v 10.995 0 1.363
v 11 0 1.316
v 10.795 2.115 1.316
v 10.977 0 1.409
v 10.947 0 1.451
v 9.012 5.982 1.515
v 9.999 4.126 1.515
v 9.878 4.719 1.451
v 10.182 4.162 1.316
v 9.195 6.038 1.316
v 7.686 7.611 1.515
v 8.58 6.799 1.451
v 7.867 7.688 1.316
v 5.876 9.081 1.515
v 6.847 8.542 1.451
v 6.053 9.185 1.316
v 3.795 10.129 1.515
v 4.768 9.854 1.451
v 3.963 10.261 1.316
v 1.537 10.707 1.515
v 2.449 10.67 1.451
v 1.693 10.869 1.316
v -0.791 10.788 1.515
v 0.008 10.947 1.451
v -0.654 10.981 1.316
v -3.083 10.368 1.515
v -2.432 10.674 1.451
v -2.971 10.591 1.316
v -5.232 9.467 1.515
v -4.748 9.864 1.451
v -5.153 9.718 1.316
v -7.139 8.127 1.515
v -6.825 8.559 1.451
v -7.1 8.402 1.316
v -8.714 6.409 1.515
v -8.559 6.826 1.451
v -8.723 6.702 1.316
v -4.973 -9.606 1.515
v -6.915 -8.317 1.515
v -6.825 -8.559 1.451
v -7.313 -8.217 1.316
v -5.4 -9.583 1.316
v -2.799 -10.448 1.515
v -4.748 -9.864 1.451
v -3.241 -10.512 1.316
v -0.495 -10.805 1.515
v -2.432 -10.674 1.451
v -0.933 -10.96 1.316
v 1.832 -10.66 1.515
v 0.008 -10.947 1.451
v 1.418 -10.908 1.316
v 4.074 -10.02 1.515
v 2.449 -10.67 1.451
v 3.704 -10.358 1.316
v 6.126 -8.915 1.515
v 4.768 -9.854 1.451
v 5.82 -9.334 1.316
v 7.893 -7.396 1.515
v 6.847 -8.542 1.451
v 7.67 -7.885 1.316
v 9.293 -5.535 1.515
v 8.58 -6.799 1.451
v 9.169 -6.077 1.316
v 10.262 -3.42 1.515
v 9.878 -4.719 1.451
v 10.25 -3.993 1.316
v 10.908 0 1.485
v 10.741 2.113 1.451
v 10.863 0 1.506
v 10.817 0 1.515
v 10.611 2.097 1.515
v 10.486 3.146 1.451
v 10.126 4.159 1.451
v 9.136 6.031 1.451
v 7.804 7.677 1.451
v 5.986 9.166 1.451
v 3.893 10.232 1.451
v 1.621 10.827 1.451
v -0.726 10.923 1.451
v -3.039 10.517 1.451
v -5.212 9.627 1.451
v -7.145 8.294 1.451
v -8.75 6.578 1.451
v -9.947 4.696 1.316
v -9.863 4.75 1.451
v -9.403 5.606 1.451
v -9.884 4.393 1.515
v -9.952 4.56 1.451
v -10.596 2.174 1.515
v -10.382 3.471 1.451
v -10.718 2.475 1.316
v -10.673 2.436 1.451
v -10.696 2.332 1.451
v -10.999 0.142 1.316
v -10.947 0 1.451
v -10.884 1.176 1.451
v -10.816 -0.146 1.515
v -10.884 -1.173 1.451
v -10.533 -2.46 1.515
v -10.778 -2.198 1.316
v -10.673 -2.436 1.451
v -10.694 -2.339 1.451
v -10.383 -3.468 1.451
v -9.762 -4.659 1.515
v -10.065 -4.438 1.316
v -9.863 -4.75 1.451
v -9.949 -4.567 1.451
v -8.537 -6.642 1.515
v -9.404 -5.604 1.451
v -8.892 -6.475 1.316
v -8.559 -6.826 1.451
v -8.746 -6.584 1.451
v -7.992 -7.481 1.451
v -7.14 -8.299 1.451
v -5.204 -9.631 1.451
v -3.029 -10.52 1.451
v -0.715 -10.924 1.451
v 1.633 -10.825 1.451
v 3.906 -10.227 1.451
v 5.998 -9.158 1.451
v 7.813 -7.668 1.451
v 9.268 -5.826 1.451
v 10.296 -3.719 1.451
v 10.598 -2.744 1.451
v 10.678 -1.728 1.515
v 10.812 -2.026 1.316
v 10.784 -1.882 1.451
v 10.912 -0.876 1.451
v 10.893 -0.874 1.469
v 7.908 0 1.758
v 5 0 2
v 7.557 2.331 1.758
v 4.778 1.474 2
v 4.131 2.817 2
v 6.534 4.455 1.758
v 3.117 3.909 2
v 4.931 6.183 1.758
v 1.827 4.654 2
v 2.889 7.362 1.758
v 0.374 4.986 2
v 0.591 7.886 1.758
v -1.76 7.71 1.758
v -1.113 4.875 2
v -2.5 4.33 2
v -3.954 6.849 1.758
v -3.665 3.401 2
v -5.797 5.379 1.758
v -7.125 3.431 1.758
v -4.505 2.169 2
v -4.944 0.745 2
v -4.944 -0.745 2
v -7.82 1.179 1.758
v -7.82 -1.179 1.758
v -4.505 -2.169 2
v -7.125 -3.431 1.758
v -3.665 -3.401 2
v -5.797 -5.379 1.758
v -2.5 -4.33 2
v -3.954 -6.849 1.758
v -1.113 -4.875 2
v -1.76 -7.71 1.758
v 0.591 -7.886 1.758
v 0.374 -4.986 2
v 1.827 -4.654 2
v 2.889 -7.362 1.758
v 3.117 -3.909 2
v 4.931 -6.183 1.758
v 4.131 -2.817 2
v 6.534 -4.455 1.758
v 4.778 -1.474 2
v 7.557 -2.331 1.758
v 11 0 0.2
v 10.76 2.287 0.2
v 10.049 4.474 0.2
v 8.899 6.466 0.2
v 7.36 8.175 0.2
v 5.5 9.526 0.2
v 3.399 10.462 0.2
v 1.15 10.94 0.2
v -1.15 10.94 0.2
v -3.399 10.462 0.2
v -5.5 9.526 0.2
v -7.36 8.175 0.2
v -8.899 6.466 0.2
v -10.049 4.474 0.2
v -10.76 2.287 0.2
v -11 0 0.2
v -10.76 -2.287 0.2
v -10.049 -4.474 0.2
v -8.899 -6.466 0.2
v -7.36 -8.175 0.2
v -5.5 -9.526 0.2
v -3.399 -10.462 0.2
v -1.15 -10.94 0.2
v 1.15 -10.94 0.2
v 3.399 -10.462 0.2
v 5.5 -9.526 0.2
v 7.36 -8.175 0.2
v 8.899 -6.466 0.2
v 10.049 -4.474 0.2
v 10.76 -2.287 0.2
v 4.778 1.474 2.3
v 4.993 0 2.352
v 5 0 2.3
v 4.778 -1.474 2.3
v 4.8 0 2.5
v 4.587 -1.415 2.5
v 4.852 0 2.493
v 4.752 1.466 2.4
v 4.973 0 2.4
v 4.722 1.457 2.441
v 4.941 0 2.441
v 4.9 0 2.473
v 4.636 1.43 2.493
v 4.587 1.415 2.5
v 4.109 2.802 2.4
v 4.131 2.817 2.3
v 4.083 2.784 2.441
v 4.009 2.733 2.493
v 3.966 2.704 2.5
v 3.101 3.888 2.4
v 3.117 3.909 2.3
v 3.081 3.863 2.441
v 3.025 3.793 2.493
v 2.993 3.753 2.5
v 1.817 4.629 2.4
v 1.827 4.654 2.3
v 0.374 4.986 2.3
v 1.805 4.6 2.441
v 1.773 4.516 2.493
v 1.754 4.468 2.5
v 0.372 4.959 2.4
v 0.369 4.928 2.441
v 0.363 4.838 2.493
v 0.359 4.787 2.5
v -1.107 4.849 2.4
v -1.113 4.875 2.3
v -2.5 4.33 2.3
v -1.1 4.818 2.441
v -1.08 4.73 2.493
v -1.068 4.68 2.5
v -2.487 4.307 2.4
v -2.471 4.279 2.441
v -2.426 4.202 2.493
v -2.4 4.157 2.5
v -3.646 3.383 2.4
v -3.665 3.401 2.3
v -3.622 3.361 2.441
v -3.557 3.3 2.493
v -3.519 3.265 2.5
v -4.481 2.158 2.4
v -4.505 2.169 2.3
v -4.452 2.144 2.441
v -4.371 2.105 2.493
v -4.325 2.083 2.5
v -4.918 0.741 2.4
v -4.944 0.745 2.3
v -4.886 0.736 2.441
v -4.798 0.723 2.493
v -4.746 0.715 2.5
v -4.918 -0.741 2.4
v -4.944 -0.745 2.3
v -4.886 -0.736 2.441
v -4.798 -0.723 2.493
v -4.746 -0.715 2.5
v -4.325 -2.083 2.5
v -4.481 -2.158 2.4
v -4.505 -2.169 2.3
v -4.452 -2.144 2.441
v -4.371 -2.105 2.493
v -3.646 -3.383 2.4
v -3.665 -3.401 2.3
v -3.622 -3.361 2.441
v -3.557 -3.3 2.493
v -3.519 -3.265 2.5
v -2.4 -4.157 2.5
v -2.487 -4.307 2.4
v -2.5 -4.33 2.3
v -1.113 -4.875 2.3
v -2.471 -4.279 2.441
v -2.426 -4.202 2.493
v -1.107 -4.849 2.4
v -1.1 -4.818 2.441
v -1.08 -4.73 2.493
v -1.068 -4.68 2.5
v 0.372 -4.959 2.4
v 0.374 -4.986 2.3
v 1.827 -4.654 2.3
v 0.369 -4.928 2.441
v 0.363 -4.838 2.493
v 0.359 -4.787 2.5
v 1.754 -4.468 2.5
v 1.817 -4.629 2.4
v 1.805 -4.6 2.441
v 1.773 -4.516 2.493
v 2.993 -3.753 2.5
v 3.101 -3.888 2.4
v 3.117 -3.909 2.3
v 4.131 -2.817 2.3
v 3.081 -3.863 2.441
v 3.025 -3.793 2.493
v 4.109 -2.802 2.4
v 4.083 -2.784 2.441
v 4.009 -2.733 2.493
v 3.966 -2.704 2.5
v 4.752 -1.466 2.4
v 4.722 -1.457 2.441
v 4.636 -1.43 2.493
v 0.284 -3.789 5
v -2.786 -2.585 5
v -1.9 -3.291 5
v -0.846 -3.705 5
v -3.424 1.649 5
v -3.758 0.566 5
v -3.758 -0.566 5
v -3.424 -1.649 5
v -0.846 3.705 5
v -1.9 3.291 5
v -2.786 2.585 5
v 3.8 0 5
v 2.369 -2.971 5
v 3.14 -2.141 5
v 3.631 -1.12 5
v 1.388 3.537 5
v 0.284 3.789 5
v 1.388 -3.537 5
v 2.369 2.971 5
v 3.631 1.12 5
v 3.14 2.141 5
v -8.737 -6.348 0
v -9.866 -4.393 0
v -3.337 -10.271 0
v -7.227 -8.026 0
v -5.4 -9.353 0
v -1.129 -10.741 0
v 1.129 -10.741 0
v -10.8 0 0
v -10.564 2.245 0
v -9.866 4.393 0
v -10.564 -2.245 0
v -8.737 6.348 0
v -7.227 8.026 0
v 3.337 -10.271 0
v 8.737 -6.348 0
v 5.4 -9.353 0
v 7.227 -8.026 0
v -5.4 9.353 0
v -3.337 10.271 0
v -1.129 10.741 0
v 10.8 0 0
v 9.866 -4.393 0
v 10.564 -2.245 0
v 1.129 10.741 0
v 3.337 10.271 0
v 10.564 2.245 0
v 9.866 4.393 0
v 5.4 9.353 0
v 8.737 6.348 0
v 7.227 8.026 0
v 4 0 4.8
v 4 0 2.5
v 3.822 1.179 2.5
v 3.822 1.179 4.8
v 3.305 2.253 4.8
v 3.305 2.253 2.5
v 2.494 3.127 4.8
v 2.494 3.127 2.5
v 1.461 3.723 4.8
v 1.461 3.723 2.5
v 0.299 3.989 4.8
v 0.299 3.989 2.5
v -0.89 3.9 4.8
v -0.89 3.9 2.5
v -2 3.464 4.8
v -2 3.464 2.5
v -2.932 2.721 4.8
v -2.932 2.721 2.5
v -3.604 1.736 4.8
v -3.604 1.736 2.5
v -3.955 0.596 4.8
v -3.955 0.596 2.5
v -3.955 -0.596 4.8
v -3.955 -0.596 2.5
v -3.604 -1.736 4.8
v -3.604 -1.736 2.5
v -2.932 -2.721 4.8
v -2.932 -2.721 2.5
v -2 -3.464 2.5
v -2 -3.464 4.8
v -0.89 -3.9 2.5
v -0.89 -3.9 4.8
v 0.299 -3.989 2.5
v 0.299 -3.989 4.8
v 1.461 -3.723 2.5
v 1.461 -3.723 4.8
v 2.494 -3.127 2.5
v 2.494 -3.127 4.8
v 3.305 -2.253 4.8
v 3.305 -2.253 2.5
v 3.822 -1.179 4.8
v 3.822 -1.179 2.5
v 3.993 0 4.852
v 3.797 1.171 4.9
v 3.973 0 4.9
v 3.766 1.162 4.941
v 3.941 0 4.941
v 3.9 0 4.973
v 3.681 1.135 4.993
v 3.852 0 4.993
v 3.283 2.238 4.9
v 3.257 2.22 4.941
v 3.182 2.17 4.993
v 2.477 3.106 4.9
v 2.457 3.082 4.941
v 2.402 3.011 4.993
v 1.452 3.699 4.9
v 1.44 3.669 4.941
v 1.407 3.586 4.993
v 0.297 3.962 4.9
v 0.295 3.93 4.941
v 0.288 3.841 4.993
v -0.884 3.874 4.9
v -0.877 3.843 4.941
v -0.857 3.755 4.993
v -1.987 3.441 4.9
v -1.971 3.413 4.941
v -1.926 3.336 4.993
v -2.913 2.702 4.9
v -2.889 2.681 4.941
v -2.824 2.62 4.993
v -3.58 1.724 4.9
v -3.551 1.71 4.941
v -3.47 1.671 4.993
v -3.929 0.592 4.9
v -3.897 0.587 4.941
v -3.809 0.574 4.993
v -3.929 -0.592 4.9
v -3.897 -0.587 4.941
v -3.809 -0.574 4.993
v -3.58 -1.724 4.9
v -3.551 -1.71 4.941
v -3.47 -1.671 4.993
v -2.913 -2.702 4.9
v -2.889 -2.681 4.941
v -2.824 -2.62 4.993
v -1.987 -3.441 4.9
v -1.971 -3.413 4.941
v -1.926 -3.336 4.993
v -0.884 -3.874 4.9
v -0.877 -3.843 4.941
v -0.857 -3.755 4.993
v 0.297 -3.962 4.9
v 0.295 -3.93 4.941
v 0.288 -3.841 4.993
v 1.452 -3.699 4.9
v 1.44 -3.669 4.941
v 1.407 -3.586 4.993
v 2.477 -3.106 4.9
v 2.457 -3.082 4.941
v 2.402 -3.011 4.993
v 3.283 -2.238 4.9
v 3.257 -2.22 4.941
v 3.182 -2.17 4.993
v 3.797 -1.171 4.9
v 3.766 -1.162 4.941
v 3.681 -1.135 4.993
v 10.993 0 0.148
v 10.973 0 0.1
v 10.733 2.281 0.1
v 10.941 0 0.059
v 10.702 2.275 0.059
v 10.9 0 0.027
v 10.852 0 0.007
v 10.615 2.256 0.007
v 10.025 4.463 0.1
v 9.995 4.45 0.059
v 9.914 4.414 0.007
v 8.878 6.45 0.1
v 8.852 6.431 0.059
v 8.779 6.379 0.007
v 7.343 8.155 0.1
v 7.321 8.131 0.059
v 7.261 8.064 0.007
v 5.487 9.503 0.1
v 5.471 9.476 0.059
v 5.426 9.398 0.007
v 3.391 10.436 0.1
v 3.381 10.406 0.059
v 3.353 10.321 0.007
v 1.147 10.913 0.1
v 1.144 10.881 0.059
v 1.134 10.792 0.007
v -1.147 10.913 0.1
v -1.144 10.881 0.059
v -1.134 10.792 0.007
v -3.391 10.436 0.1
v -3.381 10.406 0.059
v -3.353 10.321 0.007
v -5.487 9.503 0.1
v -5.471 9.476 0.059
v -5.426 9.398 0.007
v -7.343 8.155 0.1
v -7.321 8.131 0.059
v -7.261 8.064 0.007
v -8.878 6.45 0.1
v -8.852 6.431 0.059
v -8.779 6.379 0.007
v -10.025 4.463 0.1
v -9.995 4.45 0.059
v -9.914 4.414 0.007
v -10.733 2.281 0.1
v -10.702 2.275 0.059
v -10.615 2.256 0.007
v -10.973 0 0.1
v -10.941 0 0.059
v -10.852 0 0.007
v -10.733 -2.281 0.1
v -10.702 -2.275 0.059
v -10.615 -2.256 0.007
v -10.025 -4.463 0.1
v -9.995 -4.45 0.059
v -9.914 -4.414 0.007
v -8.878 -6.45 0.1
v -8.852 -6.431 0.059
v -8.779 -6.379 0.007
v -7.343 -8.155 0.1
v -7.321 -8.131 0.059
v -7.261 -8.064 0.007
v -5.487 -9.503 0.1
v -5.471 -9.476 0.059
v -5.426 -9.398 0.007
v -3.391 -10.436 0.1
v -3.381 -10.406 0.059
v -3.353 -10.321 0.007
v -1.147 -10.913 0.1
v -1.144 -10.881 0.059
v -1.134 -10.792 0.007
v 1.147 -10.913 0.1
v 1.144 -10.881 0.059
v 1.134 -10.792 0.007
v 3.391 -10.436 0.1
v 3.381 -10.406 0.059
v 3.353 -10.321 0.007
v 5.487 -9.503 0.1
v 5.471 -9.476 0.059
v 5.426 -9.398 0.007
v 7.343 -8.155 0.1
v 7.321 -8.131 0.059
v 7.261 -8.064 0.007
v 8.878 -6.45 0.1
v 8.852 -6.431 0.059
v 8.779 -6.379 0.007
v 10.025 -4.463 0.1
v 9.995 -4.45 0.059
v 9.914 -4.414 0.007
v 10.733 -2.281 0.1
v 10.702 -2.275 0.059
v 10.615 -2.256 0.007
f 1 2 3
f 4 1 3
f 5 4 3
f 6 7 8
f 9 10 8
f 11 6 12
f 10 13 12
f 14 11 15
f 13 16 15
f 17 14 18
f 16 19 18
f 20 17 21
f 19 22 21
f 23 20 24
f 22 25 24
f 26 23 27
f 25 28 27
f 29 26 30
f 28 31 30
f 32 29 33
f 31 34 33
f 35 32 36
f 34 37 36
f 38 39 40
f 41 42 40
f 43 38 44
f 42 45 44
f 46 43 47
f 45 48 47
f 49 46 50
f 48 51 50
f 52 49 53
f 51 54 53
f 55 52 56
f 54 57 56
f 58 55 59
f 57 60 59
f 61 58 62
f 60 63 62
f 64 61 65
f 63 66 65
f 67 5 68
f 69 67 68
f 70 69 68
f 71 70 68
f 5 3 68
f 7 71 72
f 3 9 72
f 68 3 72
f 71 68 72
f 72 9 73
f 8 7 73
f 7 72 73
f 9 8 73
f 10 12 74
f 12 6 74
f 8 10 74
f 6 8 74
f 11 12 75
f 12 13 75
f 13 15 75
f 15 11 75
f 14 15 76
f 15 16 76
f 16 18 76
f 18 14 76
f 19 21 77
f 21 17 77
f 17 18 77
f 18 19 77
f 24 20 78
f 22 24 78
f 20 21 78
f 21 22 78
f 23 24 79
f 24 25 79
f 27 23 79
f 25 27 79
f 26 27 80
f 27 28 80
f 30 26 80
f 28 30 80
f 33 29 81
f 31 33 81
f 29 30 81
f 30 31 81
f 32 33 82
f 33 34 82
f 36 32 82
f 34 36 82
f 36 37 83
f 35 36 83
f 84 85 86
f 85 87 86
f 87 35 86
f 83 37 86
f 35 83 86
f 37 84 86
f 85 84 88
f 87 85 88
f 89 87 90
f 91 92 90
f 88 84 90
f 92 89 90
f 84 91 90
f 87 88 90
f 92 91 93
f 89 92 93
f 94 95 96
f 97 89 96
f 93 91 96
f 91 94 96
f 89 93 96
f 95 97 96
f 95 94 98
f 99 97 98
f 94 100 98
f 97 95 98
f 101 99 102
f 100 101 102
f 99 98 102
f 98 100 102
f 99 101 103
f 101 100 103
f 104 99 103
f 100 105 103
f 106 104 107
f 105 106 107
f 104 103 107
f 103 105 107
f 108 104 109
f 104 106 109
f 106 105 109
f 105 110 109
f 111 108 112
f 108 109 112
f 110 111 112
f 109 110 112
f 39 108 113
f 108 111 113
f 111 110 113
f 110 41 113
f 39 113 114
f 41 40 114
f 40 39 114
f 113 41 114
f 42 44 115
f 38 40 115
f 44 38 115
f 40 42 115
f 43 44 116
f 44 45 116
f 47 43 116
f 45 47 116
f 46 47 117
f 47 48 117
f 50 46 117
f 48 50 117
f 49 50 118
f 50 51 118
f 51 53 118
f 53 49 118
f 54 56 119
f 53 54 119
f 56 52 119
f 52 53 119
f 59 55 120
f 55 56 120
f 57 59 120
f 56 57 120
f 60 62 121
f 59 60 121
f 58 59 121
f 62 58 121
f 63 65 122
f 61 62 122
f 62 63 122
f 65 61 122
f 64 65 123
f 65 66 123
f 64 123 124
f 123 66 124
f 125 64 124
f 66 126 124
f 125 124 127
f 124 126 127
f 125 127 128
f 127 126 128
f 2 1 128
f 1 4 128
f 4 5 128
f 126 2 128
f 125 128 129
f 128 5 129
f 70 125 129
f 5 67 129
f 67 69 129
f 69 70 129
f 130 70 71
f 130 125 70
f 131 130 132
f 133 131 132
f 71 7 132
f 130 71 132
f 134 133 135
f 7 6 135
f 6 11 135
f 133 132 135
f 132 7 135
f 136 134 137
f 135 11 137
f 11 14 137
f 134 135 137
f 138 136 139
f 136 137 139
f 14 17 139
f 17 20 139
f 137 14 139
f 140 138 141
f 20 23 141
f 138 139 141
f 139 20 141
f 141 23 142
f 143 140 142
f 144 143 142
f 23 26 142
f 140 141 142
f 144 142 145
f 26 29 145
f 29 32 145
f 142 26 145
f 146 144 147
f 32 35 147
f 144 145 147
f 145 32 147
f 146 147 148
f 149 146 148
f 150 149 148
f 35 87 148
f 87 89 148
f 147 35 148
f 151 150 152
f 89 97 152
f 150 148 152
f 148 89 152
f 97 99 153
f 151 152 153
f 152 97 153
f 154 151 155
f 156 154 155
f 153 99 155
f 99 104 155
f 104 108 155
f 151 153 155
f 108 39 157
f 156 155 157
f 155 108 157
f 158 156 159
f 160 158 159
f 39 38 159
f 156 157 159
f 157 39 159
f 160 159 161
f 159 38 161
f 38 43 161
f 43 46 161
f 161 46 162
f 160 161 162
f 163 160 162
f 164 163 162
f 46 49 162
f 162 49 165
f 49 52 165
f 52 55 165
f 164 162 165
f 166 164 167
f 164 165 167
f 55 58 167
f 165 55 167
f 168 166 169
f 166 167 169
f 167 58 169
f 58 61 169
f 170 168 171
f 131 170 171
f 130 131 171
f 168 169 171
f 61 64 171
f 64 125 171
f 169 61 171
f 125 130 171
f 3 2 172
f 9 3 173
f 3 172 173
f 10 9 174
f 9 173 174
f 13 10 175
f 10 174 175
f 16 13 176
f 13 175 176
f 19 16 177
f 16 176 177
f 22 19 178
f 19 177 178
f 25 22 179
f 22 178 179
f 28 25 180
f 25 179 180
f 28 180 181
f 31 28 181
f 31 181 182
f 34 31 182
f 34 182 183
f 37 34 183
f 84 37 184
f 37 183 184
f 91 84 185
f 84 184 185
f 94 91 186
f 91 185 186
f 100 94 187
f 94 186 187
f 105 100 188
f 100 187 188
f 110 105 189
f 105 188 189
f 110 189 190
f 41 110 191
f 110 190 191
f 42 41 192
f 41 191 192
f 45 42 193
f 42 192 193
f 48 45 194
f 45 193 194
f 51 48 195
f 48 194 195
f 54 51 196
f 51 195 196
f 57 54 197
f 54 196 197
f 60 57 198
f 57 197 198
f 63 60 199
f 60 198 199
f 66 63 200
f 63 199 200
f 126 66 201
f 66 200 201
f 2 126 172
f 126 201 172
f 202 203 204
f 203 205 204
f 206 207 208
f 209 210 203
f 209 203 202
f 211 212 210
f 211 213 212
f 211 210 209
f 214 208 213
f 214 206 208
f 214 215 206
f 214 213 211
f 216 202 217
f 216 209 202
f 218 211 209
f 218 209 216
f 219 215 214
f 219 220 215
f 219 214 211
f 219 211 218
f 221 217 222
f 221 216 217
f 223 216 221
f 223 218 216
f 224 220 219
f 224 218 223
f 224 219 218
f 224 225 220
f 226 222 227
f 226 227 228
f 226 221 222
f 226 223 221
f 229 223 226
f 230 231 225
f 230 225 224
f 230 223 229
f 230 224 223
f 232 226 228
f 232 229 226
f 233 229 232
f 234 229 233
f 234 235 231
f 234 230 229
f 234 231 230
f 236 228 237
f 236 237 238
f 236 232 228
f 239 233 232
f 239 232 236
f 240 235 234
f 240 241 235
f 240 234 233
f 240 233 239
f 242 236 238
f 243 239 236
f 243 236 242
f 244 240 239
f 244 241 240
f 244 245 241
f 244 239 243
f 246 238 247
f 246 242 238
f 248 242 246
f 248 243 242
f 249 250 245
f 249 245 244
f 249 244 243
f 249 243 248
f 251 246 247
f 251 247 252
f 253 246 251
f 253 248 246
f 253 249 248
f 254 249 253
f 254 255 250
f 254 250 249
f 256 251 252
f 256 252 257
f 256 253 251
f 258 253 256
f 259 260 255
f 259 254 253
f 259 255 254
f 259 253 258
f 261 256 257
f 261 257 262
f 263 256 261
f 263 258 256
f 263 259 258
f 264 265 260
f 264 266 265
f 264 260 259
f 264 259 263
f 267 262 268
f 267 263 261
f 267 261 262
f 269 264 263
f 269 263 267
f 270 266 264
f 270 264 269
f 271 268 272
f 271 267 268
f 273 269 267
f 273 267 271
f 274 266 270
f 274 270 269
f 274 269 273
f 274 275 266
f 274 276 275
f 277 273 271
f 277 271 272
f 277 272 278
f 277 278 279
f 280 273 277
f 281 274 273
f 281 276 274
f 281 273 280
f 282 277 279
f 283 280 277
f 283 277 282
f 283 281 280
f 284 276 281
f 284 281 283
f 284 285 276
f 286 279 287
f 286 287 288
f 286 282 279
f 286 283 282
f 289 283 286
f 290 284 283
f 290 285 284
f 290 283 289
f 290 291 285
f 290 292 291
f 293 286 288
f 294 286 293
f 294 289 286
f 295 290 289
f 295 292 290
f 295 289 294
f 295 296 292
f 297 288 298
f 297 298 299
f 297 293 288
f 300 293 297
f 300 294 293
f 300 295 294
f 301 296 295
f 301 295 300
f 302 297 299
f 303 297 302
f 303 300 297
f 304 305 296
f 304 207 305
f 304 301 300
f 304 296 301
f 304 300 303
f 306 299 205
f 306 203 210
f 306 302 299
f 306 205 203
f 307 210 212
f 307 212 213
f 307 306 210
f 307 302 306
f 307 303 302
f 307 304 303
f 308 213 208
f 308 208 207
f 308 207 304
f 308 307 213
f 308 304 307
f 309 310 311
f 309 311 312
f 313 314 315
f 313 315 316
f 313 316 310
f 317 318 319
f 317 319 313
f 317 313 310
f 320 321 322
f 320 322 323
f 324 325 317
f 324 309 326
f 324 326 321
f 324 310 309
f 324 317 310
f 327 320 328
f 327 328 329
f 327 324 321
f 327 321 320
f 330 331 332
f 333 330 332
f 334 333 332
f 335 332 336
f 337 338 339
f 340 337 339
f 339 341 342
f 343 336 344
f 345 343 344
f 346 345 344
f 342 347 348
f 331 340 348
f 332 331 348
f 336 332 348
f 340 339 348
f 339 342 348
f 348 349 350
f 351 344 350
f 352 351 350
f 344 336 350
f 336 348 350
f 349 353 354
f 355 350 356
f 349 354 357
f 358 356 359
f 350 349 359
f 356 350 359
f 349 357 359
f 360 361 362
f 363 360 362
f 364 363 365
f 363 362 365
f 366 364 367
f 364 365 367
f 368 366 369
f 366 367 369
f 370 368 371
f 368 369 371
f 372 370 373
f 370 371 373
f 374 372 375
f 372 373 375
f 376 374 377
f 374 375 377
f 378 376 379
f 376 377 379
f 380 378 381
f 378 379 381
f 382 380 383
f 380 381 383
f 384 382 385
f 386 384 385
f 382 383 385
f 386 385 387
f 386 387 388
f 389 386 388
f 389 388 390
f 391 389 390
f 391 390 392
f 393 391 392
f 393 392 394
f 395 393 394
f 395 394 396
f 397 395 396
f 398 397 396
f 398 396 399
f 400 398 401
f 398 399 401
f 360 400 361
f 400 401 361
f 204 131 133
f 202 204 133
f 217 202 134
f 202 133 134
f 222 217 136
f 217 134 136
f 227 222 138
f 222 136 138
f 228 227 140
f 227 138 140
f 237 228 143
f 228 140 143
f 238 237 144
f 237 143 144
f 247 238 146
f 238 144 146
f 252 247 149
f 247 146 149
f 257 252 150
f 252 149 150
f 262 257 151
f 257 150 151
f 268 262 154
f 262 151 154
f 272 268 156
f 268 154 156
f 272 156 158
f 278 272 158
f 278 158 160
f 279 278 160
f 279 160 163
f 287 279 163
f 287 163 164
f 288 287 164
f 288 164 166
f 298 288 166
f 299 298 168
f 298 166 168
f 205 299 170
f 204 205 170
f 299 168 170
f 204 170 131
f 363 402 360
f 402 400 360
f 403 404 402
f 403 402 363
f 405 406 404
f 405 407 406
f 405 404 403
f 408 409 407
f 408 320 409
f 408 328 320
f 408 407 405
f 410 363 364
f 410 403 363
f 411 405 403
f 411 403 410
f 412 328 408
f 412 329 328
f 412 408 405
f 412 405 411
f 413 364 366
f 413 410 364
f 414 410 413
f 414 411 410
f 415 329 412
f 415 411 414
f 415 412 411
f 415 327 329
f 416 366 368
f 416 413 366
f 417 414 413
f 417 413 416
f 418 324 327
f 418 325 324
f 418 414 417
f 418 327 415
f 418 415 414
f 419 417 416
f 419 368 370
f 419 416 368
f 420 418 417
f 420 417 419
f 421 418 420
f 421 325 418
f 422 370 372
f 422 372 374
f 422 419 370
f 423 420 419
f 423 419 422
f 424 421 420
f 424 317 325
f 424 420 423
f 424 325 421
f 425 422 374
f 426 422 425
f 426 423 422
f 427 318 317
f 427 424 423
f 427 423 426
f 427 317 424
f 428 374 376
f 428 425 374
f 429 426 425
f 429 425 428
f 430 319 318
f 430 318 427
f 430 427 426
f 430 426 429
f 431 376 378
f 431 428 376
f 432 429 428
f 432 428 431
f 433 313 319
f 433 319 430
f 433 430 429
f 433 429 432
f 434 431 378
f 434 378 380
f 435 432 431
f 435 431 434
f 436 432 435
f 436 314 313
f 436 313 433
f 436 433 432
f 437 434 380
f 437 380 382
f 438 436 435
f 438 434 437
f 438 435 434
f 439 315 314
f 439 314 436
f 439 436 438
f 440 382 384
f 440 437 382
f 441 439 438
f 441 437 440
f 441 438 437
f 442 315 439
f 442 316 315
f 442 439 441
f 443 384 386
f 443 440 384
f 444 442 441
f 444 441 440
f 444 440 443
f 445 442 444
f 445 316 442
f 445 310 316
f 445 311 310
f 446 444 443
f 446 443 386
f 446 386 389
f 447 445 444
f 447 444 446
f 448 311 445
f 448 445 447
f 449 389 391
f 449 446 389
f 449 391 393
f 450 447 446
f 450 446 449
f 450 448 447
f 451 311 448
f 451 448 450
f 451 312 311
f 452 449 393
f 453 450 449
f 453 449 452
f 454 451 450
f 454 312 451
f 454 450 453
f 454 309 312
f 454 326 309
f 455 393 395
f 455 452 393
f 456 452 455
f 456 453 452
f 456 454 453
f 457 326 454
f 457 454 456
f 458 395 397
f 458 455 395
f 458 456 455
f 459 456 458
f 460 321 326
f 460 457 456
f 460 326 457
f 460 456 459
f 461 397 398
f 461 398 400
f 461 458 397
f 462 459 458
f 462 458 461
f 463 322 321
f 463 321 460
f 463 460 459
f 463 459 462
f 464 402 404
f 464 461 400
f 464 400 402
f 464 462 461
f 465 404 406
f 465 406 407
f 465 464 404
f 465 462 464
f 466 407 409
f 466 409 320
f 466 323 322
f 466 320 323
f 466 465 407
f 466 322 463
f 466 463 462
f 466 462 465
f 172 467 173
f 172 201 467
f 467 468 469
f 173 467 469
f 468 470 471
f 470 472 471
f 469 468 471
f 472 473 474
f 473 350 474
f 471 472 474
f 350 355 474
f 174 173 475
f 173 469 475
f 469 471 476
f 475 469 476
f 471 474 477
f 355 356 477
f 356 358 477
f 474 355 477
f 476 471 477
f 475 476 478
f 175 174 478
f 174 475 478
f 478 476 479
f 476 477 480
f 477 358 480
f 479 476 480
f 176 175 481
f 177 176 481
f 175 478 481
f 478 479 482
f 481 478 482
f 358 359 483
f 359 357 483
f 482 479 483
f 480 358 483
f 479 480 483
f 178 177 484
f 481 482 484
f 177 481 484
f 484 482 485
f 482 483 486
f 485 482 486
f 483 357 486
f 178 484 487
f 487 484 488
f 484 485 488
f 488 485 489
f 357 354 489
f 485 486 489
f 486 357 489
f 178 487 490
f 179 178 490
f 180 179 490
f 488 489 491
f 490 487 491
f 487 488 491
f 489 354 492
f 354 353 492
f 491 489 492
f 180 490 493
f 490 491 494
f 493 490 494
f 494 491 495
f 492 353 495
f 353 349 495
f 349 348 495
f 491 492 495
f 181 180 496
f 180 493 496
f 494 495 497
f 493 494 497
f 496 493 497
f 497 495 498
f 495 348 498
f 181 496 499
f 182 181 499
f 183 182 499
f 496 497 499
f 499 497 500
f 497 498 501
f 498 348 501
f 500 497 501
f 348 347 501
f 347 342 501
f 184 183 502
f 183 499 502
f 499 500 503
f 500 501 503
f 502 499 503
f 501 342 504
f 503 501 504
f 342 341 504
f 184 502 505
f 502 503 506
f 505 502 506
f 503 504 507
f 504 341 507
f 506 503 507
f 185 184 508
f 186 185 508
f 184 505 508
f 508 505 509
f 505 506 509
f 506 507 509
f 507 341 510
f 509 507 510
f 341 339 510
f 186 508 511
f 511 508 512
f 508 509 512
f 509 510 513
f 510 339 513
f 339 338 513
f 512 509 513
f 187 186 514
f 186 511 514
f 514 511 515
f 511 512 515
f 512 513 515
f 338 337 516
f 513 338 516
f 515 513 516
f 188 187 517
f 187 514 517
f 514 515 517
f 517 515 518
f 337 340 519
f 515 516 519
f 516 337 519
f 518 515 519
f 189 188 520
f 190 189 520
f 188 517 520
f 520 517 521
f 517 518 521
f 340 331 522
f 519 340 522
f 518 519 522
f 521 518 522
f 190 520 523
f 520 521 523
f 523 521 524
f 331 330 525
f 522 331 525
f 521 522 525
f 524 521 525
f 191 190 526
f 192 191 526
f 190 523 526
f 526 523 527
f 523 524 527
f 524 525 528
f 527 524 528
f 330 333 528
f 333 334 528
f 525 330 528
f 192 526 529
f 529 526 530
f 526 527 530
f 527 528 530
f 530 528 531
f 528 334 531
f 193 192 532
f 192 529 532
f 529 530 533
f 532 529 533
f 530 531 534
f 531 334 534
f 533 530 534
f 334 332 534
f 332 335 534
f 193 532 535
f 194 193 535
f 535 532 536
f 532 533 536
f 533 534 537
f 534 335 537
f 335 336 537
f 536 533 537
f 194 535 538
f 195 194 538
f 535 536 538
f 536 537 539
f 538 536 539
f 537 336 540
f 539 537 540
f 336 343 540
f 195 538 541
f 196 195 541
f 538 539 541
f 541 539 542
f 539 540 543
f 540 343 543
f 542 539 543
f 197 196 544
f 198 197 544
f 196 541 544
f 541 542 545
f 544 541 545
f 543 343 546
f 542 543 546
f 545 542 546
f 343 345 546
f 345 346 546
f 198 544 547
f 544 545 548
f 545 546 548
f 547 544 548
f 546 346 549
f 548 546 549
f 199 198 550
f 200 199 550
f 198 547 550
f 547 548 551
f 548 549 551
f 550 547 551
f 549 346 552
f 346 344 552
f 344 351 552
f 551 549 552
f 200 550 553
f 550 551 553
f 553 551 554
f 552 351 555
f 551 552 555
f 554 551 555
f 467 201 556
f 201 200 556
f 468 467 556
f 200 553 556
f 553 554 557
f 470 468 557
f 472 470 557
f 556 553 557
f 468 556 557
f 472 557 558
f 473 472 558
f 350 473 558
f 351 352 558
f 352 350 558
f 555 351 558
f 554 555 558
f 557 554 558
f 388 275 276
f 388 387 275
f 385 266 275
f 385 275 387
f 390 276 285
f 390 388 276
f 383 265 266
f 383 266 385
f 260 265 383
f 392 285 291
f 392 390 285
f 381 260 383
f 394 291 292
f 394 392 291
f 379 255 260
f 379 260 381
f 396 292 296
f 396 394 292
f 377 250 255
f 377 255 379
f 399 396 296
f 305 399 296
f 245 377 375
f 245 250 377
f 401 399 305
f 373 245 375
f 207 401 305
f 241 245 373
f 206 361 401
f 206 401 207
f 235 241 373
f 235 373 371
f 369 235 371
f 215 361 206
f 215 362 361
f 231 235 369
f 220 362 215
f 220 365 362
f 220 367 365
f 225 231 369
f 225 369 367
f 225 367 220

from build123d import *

# Parameters (mm, degrees)
F0_R     = 11
F1_DEPTH = 2
F2_R     = 5
F3_DEPTH = 0.5
F4_R     = 4
F5_DEPTH = 2.5
F6_SIZE2 = 0.49999
F6_SIZE  = 5.99999
F7_R     = 0.2


# Not quite as in the source:
# - a fillet or chamfer is up to 0.001 mm smaller than in the source, because OpenCascade refuses the exact size


with BuildPart() as f1:
    # F0 (on Top) → F1 (new body)
    with BuildSketch(Plane.XY):
        Circle(F0_R)
    extrude(amount=F1_DEPTH)

    # F2 (on face) → F3 (join)
    with BuildSketch(Plane.XY.offset(2)):
        Circle(F2_R)
    extrude(amount=F3_DEPTH)

    # F4 (on face) → F5 (join)
    with BuildSketch(Plane.XY.offset(2.5)):
        Circle(F4_R)
    extrude(amount=F5_DEPTH)

    # F6 (size 6 and 0.5 in the source; OpenCascade refuses exactly that, so slightly less here)
    f6_edges = [f1.edges().sort_by_distance(p)[0] for p in [
        (-11, 0, 2),
    ]]
    f6_side = f1.faces().sort_by_distance((-10.688873, 0, 2))[0]
    chamfer(f6_edges, length=F6_SIZE, length2=F6_SIZE2, reference=f6_side)

    # F7
    f7_edges = [f1.edges().sort_by_distance(p)[0] for p in [
        (-4, 0, 5),
        (-5, 0, 2.5),
        (-11, 0, 0),
        (-11, 0, 1.50001),
    ]]
    fillet(f7_edges, radius=F7_R)


solid = f1.part
